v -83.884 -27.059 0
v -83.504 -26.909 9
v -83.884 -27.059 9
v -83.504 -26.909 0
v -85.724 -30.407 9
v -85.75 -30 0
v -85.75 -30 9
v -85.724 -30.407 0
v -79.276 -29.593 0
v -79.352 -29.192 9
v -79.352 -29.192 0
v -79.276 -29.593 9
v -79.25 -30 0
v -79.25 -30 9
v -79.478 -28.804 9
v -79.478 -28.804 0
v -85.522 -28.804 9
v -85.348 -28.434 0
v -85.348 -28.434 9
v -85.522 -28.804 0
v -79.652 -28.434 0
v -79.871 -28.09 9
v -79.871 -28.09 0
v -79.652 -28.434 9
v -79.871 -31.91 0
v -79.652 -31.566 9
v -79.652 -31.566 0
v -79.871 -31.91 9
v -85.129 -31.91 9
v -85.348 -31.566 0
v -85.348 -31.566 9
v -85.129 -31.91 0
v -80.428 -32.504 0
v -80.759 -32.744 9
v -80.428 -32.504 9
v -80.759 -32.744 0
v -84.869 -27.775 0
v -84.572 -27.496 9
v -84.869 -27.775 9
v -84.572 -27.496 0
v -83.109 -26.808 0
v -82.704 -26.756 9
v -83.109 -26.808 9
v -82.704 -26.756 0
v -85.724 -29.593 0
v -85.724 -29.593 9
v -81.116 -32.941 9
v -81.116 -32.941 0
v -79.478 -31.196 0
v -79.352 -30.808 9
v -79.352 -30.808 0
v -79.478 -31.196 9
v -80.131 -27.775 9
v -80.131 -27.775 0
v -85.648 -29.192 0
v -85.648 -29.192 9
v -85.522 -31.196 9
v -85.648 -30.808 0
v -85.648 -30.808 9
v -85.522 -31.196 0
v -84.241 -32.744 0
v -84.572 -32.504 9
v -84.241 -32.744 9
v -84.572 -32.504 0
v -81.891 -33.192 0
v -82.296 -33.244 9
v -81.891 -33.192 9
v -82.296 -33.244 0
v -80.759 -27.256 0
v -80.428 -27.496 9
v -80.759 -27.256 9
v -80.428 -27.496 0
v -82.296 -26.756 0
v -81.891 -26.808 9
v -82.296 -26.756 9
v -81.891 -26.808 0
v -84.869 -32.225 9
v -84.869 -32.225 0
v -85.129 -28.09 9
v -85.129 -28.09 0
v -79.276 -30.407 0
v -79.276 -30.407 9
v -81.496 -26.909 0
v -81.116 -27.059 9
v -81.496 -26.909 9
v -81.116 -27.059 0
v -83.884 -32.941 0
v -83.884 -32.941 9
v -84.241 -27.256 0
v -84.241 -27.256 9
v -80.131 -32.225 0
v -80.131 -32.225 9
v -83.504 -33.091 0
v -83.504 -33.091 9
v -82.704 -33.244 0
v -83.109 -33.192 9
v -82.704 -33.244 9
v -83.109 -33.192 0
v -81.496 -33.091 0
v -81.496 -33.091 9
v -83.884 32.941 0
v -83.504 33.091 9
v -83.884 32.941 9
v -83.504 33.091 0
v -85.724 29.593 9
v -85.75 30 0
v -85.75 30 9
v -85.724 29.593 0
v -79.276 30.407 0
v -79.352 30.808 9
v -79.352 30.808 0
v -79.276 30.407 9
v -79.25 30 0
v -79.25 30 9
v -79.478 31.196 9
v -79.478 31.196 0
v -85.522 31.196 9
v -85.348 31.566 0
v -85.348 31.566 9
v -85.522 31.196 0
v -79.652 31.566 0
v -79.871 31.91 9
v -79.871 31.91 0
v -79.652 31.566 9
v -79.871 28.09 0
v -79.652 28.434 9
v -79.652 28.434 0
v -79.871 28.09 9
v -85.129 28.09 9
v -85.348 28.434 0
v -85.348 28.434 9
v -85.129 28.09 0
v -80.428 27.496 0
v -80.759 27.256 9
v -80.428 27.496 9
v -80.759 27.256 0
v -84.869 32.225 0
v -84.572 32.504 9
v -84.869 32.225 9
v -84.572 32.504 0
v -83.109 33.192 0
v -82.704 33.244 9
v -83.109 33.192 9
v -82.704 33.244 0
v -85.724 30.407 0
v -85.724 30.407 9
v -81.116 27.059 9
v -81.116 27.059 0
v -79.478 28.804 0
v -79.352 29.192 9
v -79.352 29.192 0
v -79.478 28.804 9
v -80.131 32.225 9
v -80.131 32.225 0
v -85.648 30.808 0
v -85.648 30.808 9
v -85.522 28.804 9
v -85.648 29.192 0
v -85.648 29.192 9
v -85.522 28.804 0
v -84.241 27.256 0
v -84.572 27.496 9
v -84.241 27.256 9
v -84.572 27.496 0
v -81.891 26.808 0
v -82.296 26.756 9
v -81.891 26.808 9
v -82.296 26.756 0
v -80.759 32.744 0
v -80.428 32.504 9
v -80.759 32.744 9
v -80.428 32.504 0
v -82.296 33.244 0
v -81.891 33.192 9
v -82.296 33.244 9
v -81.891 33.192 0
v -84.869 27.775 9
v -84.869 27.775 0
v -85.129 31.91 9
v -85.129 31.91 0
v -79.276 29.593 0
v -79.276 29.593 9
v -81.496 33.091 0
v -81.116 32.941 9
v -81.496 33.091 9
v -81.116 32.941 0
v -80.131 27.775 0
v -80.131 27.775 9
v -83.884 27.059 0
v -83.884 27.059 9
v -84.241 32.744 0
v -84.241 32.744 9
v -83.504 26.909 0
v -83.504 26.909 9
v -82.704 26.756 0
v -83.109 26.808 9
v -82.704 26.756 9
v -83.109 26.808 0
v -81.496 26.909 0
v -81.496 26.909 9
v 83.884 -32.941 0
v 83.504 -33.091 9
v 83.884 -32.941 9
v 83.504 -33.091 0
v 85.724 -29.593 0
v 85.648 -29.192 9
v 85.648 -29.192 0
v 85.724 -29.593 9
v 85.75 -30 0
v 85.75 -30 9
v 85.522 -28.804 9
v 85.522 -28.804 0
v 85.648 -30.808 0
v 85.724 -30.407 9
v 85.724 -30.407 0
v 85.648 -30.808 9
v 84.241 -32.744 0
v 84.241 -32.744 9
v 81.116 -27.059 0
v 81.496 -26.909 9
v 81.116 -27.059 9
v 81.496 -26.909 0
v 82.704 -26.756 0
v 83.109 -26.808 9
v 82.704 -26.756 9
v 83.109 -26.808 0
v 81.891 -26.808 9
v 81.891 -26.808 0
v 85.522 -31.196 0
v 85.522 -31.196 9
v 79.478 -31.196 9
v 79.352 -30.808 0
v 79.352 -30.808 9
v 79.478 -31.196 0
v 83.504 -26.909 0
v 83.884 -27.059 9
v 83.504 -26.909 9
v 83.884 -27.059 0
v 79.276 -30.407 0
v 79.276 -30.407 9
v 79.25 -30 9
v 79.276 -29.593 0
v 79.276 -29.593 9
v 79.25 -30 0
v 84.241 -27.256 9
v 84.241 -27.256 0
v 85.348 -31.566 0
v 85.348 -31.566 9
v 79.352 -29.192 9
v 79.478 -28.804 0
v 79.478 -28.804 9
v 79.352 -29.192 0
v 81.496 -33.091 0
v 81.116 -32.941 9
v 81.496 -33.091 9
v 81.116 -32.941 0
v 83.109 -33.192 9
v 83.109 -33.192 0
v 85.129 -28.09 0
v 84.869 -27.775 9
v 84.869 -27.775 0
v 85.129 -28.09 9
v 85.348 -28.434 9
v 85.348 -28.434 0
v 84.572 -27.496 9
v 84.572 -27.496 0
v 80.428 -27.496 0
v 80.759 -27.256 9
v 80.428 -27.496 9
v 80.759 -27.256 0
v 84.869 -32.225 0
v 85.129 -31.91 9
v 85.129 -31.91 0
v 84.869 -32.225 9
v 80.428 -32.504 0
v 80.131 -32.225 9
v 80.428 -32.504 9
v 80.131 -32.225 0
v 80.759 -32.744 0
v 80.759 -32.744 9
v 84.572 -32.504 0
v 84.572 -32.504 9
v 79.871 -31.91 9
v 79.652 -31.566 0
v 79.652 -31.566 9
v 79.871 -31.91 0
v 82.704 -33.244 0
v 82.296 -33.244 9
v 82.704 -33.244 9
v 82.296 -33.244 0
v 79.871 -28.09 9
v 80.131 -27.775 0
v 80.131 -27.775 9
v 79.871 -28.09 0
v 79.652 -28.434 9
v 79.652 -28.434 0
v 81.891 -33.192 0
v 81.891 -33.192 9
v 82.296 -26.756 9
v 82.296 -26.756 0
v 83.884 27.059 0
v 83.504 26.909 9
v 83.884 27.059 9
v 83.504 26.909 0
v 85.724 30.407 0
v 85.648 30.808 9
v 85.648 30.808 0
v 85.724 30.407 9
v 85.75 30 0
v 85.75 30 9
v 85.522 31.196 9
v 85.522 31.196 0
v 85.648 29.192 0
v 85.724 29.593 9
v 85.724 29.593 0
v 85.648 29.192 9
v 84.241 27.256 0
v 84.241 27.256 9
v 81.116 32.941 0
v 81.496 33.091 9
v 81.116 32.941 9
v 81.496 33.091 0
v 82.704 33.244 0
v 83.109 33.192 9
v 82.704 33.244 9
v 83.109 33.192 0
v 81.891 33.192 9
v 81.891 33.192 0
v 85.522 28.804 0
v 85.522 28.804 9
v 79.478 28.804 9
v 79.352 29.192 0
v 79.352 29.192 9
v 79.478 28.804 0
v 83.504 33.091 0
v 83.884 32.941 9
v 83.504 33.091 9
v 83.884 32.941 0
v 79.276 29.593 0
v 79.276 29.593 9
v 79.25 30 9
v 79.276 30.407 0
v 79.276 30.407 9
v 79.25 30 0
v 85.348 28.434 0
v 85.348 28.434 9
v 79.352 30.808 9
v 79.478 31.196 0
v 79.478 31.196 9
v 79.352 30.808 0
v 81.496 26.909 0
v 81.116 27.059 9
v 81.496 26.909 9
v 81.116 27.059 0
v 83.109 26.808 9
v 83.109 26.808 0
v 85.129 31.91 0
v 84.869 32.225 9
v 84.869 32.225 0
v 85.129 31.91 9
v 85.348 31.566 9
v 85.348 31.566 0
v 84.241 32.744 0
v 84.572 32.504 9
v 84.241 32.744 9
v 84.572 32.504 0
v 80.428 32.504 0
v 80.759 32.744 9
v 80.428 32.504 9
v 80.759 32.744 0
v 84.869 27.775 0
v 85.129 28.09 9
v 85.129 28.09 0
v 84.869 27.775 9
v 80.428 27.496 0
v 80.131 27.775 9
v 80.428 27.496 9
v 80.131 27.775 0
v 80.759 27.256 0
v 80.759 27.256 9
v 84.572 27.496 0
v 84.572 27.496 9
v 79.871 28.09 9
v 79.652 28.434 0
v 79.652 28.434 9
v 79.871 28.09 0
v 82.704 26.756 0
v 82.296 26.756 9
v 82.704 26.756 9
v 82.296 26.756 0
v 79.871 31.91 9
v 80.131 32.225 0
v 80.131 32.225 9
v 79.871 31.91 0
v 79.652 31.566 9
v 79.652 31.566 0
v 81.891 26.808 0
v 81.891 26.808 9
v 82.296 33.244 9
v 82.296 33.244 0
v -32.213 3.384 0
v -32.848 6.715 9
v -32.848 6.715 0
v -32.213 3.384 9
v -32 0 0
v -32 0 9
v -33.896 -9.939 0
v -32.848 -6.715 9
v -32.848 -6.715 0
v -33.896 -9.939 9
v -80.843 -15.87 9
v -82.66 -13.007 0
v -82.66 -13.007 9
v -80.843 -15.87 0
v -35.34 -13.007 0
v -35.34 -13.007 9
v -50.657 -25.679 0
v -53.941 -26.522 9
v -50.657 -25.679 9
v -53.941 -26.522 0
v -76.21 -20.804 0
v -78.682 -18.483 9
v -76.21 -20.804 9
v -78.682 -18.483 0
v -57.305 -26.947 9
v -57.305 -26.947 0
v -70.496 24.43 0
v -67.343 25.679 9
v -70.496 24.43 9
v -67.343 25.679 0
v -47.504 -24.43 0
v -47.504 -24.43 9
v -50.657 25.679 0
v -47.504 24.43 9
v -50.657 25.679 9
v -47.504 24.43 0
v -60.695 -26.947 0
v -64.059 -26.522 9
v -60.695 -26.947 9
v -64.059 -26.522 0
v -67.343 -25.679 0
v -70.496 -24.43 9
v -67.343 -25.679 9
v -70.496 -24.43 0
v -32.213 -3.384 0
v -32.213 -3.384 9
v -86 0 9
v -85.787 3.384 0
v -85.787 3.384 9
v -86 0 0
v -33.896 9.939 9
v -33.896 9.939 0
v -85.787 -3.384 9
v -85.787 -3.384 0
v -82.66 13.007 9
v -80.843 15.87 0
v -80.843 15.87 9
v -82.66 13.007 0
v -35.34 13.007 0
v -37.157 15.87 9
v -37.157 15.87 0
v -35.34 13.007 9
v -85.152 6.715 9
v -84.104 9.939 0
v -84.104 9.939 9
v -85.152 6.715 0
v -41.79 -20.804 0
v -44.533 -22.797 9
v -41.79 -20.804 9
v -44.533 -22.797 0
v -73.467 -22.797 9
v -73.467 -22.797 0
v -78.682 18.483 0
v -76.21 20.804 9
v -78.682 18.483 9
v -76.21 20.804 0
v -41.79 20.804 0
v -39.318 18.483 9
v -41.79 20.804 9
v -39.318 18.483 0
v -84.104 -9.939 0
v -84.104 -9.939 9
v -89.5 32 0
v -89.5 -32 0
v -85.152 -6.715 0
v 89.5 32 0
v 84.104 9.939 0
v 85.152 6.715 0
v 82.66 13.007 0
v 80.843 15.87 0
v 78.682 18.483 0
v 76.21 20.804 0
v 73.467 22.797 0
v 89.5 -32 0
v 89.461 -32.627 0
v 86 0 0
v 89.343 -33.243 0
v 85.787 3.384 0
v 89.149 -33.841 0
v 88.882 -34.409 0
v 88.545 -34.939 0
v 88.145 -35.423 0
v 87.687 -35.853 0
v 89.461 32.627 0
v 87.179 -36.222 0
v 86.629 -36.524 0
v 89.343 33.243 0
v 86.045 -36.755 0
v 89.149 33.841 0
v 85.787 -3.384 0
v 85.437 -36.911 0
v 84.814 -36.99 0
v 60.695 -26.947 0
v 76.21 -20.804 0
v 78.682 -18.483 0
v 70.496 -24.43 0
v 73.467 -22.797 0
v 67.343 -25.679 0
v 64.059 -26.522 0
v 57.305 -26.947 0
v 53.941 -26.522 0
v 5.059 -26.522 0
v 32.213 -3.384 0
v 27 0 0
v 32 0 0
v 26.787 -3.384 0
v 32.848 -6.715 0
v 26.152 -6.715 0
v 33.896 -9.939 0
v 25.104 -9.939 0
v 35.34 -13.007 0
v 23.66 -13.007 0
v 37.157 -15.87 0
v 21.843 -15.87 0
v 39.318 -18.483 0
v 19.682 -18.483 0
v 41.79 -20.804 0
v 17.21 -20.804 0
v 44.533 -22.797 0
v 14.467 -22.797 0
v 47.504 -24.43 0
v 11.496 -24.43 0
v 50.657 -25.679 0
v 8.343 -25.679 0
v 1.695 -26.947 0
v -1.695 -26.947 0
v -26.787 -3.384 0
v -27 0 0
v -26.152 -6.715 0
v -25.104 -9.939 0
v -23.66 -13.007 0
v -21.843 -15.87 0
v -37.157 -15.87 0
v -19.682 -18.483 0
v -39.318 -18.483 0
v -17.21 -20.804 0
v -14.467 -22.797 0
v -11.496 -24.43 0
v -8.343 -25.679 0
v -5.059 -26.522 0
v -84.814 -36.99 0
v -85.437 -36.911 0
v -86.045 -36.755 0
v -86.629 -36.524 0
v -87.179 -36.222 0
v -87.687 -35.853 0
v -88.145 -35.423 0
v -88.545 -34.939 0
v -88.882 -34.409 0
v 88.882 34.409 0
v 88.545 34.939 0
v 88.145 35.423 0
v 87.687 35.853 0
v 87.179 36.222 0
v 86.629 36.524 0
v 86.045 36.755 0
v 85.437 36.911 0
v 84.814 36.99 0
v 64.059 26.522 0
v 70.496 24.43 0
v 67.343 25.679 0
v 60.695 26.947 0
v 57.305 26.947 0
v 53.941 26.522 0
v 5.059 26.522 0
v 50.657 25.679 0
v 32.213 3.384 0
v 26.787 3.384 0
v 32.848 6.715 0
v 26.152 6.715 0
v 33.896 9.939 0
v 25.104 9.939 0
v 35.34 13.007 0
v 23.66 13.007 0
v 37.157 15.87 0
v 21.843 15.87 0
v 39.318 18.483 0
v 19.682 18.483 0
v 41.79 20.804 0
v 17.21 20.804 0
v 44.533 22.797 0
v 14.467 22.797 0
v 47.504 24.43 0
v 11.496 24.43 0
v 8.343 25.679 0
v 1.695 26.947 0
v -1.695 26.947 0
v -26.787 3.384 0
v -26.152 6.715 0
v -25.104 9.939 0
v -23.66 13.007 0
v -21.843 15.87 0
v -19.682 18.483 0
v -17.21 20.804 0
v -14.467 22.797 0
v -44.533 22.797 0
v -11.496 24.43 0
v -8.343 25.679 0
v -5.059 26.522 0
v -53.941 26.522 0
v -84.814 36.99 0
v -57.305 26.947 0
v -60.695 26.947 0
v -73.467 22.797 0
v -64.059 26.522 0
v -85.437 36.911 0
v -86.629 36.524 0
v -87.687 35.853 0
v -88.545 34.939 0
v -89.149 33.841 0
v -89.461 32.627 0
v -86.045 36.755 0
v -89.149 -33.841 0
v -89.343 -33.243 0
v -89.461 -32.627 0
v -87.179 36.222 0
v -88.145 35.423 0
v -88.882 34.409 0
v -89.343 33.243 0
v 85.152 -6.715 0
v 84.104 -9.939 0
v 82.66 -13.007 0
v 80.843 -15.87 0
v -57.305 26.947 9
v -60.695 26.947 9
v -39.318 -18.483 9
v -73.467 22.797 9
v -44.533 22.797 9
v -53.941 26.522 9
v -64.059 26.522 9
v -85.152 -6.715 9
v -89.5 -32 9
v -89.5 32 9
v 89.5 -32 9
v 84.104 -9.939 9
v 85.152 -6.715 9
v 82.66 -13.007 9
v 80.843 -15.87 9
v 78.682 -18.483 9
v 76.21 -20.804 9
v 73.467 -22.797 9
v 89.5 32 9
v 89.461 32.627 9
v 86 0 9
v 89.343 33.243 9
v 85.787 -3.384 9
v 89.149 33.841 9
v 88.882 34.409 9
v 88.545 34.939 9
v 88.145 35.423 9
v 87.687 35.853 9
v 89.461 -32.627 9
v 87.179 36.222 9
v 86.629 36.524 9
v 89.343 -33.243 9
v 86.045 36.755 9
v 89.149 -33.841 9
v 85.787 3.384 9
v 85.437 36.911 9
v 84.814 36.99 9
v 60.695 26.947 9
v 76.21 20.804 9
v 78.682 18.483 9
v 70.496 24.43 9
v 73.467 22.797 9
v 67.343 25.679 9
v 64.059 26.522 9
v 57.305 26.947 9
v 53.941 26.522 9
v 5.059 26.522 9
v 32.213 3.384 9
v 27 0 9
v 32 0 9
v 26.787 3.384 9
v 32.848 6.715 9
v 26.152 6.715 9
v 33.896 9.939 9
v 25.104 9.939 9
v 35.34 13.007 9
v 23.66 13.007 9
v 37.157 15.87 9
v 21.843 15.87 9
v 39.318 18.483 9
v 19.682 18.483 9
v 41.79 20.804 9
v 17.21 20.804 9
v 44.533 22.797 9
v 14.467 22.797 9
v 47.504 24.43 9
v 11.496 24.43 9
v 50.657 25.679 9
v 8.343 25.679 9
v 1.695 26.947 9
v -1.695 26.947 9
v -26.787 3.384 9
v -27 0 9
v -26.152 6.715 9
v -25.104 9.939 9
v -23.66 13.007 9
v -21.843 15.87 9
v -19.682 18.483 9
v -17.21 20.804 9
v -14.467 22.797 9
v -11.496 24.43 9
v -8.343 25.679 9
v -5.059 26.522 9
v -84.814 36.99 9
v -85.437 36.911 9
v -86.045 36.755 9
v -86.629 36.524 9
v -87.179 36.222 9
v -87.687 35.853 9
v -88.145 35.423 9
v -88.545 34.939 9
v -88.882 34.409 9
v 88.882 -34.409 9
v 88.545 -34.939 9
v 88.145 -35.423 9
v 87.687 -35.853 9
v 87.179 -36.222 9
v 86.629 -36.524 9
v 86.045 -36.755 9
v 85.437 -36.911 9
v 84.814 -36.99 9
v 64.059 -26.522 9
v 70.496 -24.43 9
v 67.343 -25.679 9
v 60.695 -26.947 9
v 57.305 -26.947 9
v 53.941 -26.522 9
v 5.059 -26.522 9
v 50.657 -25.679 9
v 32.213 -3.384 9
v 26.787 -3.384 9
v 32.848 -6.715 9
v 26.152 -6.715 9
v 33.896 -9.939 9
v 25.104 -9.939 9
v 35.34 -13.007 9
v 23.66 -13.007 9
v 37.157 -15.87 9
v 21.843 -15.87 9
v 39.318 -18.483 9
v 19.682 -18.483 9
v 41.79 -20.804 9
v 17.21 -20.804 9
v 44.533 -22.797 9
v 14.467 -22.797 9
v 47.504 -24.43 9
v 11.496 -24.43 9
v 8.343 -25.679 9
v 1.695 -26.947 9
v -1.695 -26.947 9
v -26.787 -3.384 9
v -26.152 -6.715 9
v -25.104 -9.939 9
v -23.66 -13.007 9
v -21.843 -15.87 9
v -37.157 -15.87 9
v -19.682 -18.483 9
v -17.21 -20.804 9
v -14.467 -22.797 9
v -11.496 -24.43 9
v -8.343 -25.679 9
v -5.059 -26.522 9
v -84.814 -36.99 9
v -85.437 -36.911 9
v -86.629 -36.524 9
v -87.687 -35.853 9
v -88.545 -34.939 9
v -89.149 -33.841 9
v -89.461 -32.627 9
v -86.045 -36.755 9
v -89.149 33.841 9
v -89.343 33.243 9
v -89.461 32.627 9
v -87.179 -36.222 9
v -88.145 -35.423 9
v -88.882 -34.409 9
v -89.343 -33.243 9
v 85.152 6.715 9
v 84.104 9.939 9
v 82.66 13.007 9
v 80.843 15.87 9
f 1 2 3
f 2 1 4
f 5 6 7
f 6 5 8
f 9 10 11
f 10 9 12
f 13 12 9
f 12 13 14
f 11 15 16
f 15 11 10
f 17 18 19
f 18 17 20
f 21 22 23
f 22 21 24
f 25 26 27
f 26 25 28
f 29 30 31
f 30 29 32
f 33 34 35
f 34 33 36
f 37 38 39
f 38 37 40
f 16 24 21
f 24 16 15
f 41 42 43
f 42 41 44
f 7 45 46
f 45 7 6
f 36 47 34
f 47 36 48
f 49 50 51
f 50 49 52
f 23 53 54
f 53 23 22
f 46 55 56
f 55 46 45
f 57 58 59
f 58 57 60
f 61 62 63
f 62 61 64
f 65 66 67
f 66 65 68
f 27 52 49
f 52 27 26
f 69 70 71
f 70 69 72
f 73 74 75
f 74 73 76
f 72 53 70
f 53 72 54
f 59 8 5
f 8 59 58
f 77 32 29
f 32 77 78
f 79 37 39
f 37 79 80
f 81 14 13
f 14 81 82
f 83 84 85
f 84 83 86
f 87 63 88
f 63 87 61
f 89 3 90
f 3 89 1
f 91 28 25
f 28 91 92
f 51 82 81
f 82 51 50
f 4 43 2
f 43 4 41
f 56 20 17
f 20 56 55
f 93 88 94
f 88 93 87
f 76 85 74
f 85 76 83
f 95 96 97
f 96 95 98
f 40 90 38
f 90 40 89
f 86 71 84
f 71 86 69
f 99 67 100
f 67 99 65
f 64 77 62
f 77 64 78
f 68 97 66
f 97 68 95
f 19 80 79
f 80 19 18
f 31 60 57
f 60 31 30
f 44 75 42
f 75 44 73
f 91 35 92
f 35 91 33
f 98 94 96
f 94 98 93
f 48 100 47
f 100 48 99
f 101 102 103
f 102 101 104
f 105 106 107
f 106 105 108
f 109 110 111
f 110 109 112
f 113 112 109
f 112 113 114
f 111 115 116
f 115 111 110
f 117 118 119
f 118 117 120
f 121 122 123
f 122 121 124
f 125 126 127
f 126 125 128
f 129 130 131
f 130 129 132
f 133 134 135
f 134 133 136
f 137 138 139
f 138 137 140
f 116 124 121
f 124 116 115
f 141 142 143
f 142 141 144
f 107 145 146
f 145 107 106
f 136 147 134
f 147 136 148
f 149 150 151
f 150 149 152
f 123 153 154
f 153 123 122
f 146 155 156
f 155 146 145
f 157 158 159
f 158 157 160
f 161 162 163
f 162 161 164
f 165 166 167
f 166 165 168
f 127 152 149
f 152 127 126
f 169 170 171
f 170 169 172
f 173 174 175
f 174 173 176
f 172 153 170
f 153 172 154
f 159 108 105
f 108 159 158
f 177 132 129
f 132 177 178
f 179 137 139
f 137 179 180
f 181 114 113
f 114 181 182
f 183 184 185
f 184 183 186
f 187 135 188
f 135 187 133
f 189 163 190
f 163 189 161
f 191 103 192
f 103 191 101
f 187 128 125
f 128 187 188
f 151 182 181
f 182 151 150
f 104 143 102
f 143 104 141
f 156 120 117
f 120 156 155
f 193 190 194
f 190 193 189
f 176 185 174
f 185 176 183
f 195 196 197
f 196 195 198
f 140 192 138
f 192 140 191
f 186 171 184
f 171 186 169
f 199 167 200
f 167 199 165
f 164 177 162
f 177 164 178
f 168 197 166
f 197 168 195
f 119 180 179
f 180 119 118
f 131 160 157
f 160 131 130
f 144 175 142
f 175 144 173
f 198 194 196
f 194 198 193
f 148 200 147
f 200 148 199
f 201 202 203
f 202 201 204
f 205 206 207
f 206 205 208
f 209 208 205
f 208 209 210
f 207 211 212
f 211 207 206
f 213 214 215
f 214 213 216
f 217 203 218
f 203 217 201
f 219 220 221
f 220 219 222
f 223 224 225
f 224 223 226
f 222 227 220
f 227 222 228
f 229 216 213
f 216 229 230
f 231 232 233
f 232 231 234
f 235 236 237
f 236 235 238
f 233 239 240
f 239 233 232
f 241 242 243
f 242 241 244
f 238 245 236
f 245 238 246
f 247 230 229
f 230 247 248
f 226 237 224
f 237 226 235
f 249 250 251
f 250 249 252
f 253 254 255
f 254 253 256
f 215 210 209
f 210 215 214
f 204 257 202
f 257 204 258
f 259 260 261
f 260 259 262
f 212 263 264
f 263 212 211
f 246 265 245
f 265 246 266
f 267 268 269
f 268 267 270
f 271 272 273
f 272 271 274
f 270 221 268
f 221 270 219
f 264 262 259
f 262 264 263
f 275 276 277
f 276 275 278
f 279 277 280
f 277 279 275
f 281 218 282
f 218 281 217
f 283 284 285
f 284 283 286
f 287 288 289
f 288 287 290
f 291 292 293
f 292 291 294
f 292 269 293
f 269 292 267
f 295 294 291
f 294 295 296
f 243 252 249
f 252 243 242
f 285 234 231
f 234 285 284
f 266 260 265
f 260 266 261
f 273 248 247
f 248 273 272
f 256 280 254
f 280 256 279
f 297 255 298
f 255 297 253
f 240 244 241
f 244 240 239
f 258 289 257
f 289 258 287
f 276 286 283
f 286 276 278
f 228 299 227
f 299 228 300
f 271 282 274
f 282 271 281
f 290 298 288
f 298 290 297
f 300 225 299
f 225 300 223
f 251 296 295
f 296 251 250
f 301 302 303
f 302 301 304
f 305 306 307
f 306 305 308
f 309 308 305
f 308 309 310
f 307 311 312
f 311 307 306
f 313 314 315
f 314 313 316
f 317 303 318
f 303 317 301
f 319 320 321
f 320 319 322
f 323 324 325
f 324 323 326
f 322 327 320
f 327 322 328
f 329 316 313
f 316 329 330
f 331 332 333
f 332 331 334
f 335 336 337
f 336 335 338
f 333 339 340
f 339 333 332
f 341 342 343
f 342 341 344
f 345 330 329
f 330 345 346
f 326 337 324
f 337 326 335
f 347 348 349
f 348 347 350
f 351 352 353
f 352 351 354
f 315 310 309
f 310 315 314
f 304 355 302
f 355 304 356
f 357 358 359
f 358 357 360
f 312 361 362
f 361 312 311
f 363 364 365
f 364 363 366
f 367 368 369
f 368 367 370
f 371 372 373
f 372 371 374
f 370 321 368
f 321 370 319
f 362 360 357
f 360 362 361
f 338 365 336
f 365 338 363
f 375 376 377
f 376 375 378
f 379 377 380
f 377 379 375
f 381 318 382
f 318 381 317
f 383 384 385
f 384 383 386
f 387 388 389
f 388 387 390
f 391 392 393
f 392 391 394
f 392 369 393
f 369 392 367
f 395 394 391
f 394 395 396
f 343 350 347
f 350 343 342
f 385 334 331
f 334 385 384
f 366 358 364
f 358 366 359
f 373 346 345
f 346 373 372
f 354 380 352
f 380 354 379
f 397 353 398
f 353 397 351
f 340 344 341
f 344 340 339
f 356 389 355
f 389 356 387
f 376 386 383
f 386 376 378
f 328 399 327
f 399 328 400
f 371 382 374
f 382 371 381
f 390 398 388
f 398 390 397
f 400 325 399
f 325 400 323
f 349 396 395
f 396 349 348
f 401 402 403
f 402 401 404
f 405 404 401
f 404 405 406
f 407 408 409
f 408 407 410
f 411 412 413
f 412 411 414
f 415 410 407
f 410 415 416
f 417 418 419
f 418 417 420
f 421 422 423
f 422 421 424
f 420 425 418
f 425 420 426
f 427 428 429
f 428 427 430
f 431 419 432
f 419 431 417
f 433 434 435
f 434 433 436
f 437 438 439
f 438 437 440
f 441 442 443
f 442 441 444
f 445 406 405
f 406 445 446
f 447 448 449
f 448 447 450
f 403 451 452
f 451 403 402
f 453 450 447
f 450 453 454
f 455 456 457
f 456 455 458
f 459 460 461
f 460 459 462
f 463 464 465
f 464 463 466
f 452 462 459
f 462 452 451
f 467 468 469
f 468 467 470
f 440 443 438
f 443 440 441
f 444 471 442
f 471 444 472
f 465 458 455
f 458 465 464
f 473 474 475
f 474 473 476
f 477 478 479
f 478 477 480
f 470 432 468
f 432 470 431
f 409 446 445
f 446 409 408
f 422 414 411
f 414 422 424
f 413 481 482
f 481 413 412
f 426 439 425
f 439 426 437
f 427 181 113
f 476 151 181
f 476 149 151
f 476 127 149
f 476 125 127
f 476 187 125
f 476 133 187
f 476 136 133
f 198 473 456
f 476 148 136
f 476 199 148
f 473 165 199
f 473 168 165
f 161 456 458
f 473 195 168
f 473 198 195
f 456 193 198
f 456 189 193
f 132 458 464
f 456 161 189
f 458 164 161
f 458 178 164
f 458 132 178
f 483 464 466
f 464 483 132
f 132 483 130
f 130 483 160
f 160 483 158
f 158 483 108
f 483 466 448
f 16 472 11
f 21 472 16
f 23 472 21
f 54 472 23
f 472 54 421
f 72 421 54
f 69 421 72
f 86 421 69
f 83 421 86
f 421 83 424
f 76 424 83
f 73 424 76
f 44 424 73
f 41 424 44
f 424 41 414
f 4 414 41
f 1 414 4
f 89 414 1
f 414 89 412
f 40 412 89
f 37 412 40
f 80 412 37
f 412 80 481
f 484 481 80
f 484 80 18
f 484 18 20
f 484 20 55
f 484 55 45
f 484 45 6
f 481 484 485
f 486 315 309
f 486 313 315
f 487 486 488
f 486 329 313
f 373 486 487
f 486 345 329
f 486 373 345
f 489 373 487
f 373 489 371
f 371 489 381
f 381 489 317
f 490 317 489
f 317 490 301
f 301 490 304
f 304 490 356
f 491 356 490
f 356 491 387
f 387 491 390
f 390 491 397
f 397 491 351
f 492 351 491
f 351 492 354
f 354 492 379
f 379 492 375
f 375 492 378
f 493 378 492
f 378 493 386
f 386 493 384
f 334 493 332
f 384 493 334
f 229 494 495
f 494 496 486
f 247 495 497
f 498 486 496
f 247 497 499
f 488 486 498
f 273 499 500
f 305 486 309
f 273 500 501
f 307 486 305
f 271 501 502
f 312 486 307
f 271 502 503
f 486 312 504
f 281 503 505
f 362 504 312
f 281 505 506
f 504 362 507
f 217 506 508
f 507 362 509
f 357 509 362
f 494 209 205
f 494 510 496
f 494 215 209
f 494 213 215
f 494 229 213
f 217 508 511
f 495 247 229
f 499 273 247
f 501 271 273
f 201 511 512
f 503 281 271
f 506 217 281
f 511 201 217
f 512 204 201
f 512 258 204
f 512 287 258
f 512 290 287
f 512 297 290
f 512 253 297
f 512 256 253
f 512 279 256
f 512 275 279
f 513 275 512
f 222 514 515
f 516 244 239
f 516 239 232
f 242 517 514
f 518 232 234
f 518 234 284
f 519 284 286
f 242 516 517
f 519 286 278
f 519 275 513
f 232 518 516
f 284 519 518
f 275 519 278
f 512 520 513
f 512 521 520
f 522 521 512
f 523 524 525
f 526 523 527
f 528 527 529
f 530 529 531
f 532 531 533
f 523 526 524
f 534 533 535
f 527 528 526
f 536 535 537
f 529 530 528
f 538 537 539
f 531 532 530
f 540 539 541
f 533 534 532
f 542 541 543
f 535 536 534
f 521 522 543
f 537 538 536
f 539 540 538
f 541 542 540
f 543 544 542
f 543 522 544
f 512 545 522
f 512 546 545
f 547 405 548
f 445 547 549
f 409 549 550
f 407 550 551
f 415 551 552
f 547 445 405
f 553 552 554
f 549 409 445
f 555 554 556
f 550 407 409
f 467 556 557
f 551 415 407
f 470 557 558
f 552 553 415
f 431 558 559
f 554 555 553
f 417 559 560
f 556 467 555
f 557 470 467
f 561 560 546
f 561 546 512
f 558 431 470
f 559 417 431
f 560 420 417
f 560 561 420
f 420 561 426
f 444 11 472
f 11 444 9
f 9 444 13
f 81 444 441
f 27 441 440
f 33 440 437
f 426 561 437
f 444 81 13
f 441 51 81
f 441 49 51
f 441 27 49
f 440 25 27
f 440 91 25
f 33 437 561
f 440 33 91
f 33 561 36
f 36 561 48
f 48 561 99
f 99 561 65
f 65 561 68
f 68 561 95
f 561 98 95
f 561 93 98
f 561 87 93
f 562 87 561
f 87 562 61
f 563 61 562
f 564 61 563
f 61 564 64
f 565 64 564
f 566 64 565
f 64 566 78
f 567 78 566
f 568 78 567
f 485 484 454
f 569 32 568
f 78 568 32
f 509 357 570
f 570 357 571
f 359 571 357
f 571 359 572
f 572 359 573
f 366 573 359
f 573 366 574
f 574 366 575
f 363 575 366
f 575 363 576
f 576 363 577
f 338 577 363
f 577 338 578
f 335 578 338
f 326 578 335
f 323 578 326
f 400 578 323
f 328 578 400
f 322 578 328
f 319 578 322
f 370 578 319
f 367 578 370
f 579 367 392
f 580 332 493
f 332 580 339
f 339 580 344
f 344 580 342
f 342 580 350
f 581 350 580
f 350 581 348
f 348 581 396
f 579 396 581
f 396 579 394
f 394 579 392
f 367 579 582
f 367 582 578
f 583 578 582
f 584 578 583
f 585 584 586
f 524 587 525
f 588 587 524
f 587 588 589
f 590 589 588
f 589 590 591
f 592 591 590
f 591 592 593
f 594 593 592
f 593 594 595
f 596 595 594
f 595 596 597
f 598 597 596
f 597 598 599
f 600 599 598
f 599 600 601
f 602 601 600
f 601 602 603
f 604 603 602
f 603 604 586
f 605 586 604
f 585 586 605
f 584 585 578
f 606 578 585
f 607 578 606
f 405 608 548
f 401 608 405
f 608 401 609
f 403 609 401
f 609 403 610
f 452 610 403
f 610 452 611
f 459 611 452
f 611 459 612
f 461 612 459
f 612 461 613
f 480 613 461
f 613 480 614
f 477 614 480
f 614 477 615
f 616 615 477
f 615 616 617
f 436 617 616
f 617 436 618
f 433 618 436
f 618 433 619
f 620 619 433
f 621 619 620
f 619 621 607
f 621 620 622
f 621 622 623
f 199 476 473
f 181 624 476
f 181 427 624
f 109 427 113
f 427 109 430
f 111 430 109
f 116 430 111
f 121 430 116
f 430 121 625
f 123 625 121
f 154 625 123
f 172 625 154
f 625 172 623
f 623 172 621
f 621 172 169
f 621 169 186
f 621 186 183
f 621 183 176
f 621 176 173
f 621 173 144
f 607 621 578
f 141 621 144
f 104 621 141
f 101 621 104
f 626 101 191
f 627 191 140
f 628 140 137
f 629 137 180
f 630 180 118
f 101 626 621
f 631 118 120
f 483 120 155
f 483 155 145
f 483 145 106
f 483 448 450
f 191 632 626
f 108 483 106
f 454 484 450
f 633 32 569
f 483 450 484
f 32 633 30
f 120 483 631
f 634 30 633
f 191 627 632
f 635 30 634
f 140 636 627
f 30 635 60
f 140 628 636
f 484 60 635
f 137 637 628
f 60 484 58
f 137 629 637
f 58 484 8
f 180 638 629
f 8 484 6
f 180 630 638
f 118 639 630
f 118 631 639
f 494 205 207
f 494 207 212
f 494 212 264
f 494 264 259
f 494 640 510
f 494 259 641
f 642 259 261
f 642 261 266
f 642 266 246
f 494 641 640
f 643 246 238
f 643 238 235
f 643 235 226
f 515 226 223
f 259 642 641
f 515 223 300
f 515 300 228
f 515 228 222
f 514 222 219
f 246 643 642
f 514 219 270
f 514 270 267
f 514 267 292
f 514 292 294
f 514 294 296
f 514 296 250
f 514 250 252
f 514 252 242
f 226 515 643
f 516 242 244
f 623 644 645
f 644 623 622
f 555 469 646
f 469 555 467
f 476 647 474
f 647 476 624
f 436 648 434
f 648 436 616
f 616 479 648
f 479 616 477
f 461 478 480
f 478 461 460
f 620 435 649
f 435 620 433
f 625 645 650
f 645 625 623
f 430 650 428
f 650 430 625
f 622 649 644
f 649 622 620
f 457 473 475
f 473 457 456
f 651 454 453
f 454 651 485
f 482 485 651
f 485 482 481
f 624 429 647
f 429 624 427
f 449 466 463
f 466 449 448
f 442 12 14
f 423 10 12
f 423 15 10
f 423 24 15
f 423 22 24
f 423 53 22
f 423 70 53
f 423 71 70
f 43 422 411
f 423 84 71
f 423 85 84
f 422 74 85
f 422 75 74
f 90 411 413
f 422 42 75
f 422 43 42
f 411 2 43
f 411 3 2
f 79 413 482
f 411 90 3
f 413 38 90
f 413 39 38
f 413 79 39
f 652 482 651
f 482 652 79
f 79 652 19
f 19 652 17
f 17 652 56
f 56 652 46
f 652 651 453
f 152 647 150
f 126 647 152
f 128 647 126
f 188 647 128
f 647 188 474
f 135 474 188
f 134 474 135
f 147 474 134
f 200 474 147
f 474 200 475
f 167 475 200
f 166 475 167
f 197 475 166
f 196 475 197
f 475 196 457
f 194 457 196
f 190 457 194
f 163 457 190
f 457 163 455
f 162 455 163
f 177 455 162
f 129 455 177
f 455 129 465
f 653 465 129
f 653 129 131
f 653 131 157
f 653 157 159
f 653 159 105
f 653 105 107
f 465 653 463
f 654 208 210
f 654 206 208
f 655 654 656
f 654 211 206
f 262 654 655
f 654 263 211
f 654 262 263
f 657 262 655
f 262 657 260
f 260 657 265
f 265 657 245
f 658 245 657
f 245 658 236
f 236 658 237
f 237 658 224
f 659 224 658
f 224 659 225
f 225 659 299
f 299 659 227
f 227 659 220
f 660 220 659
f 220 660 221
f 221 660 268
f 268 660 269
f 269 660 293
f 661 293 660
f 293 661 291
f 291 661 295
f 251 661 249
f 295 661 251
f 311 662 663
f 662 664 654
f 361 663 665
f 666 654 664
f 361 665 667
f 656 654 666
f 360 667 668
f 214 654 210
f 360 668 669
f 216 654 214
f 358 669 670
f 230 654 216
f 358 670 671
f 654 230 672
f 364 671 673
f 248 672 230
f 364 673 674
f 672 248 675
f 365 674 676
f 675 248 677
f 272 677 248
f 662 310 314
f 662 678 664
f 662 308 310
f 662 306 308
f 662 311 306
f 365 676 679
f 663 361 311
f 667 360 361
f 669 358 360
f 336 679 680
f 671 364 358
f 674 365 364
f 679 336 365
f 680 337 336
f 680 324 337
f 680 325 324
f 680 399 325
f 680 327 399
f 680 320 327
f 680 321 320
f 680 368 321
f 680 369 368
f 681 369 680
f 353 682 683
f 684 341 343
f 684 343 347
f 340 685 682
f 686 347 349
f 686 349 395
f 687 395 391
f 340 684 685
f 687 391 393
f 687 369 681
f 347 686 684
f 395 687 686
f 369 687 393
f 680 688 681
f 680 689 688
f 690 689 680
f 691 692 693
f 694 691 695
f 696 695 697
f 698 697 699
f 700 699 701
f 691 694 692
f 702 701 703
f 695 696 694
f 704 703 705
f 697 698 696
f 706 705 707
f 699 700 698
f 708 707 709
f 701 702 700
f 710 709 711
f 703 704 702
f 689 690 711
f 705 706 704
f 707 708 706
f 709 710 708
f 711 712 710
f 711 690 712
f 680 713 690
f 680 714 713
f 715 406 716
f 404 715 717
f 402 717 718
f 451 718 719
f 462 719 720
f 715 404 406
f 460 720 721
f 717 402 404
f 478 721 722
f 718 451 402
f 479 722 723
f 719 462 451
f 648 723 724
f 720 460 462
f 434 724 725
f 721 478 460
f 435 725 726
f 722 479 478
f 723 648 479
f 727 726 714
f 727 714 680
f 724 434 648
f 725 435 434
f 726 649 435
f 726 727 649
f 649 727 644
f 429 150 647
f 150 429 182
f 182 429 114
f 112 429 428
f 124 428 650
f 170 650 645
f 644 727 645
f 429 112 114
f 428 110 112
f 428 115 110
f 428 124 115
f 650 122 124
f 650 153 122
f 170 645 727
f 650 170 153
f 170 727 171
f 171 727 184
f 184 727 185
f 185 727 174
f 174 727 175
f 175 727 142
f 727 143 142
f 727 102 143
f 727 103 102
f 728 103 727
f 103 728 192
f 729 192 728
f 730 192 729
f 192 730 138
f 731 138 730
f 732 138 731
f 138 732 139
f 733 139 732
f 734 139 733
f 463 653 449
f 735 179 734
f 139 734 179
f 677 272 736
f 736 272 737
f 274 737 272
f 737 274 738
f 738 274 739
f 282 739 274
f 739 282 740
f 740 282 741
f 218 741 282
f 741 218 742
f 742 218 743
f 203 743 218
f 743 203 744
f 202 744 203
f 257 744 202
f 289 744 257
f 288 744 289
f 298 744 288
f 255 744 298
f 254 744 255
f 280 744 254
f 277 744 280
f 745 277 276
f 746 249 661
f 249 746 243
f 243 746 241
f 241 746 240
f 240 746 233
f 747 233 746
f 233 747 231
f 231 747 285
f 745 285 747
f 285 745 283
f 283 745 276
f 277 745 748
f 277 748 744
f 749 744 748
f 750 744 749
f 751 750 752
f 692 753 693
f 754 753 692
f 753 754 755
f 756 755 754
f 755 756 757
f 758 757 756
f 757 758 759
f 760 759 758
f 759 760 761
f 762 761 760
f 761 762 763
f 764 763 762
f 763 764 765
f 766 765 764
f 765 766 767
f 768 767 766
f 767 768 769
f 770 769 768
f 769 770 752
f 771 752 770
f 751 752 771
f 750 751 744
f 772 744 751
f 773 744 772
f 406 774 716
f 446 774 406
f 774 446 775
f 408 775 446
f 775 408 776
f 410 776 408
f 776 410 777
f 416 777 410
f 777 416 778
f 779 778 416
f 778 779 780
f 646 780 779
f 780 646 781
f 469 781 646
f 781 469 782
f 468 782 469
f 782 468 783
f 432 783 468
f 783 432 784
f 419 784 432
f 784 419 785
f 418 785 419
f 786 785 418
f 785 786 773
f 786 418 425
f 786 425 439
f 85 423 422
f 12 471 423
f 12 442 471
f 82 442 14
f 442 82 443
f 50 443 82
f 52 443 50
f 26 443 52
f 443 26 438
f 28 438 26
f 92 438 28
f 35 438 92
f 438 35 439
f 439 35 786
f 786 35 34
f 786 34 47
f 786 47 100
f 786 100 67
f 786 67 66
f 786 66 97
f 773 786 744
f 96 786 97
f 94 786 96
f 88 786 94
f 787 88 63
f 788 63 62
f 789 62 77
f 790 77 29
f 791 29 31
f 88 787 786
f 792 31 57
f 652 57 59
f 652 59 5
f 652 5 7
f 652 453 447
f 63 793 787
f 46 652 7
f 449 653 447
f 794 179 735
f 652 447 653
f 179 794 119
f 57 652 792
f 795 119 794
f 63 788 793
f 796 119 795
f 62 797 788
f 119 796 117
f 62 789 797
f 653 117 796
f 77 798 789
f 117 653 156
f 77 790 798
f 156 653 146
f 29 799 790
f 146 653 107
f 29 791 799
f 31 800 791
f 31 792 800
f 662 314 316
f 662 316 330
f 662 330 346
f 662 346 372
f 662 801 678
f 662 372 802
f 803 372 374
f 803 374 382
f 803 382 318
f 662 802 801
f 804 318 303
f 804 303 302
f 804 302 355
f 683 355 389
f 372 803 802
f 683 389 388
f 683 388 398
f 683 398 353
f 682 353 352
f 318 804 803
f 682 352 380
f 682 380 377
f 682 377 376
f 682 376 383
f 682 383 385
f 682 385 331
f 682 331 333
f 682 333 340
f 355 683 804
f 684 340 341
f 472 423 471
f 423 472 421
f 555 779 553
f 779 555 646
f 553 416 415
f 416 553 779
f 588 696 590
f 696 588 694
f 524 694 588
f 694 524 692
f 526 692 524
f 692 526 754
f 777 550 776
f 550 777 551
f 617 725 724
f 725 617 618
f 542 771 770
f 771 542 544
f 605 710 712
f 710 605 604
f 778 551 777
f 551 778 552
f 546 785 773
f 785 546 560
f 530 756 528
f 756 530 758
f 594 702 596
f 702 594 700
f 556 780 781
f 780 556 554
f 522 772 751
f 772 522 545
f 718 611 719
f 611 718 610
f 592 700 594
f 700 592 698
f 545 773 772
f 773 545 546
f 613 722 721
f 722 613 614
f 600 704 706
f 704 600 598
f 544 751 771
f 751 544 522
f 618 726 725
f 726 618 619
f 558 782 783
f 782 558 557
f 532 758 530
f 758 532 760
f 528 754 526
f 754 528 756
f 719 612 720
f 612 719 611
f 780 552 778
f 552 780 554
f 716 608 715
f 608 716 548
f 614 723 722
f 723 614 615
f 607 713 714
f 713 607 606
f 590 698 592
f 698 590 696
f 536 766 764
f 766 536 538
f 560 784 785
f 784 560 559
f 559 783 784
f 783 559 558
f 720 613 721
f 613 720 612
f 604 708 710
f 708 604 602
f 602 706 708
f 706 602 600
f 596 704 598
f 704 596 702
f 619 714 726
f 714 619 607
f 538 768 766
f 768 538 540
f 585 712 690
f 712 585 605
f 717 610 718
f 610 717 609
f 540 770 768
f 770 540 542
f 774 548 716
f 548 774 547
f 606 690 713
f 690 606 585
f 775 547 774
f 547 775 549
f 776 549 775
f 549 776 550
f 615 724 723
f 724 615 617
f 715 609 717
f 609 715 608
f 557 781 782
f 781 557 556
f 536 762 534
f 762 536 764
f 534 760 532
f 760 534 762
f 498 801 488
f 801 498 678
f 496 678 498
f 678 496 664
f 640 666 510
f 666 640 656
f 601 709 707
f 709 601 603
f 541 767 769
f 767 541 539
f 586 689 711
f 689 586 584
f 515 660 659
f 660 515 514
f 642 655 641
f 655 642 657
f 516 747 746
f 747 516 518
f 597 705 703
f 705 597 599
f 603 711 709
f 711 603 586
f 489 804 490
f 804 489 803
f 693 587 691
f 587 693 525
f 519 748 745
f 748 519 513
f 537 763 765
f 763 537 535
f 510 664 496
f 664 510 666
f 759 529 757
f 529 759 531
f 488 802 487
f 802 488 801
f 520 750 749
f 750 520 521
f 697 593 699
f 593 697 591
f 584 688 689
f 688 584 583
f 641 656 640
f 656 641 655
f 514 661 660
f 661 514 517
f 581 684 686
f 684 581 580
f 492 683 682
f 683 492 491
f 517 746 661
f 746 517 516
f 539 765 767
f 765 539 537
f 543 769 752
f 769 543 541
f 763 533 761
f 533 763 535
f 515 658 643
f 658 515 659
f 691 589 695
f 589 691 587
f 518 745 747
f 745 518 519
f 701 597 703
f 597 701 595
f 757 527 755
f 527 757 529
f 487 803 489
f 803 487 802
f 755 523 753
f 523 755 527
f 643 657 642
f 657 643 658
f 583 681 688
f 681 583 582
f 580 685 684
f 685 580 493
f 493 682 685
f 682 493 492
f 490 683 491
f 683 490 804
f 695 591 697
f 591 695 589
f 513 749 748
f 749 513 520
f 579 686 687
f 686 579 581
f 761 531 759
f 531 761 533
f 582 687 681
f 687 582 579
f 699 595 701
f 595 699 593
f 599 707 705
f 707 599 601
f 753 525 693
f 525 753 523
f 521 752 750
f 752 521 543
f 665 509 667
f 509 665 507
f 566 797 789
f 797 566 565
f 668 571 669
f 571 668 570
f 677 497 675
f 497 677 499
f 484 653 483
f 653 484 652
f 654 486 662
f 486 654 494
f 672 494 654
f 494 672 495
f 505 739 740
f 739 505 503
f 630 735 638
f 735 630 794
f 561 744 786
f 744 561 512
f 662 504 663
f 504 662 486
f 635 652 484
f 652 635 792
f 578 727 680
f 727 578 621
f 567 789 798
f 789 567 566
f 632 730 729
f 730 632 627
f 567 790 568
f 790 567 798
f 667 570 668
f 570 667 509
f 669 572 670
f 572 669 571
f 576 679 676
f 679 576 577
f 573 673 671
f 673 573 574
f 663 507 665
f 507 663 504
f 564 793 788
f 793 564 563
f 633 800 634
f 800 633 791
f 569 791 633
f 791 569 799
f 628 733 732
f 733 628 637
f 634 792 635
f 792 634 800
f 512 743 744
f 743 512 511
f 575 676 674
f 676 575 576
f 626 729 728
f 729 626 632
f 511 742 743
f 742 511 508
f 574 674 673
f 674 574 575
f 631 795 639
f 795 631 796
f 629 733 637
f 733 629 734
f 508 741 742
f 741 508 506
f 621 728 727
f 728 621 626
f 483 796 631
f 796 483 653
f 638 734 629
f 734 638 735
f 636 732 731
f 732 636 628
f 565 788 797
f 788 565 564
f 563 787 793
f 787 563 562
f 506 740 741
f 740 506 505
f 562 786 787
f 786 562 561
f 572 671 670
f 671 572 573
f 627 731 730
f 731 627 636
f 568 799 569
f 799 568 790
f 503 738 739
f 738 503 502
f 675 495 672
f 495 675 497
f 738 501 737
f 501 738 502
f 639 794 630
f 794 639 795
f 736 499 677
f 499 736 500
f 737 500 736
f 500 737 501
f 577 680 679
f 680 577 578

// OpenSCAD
$fn = 50;


difference() {
	union() {
		hull() {
			translate(v = [-84.5000000000, 32.0000000000, 0]) {
				cylinder(h = 9, r = 5);
			}
			translate(v = [84.5000000000, 32.0000000000, 0]) {
				cylinder(h = 9, r = 5);
			}
			translate(v = [-84.5000000000, -32.0000000000, 0]) {
				cylinder(h = 9, r = 5);
			}
			translate(v = [84.5000000000, -32.0000000000, 0]) {
				cylinder(h = 9, r = 5);
			}
		}
	}
	union() {
		#translate(v = [-82.5000000000, -30.0000000000, -100.0000000000]) {
			cylinder(h = 200, r = 3.2500000000);
		}
		#translate(v = [-82.5000000000, 30.0000000000, -100.0000000000]) {
			cylinder(h = 200, r = 3.2500000000);
		}
		#translate(v = [82.5000000000, -30.0000000000, -100.0000000000]) {
			cylinder(h = 200, r = 3.2500000000);
		}
		#translate(v = [82.5000000000, 30.0000000000, -100.0000000000]) {
			cylinder(h = 200, r = 3.2500000000);
		}
		#translate(v = [-59.0000000000, 0, 0]) {
			cylinder(h = 9, r = 27.0000000000);
		}
		#cylinder(h = 9, r = 27.0000000000);
		#translate(v = [59.0000000000, 0, 0]) {
			cylinder(h = 9, r = 27.0000000000);
		}
	}
}
